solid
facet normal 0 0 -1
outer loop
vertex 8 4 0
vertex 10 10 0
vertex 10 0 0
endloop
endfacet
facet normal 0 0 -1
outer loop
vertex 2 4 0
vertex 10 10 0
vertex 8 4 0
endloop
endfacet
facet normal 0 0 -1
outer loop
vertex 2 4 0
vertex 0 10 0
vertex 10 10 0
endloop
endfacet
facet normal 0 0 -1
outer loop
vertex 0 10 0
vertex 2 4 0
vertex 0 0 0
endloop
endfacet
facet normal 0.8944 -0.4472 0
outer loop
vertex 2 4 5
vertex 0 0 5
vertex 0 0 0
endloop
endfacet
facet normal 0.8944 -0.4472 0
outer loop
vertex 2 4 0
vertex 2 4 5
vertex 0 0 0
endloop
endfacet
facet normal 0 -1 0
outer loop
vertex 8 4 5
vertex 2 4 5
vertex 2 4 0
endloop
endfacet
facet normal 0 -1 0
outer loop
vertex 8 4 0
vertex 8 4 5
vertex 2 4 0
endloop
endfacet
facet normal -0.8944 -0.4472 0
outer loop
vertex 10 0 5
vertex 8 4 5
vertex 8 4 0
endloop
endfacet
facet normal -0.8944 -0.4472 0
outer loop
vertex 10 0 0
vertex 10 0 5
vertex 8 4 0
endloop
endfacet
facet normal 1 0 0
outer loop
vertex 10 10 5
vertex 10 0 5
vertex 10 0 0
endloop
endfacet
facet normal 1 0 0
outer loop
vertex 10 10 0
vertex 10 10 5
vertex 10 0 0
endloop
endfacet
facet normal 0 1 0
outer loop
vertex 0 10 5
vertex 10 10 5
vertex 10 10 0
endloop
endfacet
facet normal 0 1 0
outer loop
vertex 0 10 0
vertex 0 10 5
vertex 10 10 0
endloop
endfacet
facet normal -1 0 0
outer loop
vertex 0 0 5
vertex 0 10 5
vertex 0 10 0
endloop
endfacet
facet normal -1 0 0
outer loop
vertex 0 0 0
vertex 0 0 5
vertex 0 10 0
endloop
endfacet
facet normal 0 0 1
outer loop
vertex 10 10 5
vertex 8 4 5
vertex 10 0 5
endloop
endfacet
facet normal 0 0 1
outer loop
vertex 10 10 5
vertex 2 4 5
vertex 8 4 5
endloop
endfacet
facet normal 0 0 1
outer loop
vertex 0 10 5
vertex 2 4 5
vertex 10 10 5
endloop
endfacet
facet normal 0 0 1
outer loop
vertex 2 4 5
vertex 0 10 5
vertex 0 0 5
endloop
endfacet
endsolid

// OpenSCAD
// Volume: 340, SurfaceArea: 360.7213595499958
polyhedron(points = [[0, 0, 0], [2, 4, 0], [8, 4, 0], [10, 0, 0], [10, 10, 0], [0, 10, 0], [0, 0, 5], [2, 4, 5], [8, 4, 5], [10, 0, 5], [10, 10, 5], [0, 10, 5]], faces = [[0, 1, 2, 3, 4, 5], [0, 6, 7], [0, 7, 1], [1, 7, 8], [1, 8, 2], [2, 8, 9], [2, 9, 3], [3, 9, 10], [3, 10, 4], [4, 10, 11], [4, 11, 5], [5, 11, 6], [5, 6, 0], [11, 10, 9, 8, 7, 6]], convexity = 2);
                
